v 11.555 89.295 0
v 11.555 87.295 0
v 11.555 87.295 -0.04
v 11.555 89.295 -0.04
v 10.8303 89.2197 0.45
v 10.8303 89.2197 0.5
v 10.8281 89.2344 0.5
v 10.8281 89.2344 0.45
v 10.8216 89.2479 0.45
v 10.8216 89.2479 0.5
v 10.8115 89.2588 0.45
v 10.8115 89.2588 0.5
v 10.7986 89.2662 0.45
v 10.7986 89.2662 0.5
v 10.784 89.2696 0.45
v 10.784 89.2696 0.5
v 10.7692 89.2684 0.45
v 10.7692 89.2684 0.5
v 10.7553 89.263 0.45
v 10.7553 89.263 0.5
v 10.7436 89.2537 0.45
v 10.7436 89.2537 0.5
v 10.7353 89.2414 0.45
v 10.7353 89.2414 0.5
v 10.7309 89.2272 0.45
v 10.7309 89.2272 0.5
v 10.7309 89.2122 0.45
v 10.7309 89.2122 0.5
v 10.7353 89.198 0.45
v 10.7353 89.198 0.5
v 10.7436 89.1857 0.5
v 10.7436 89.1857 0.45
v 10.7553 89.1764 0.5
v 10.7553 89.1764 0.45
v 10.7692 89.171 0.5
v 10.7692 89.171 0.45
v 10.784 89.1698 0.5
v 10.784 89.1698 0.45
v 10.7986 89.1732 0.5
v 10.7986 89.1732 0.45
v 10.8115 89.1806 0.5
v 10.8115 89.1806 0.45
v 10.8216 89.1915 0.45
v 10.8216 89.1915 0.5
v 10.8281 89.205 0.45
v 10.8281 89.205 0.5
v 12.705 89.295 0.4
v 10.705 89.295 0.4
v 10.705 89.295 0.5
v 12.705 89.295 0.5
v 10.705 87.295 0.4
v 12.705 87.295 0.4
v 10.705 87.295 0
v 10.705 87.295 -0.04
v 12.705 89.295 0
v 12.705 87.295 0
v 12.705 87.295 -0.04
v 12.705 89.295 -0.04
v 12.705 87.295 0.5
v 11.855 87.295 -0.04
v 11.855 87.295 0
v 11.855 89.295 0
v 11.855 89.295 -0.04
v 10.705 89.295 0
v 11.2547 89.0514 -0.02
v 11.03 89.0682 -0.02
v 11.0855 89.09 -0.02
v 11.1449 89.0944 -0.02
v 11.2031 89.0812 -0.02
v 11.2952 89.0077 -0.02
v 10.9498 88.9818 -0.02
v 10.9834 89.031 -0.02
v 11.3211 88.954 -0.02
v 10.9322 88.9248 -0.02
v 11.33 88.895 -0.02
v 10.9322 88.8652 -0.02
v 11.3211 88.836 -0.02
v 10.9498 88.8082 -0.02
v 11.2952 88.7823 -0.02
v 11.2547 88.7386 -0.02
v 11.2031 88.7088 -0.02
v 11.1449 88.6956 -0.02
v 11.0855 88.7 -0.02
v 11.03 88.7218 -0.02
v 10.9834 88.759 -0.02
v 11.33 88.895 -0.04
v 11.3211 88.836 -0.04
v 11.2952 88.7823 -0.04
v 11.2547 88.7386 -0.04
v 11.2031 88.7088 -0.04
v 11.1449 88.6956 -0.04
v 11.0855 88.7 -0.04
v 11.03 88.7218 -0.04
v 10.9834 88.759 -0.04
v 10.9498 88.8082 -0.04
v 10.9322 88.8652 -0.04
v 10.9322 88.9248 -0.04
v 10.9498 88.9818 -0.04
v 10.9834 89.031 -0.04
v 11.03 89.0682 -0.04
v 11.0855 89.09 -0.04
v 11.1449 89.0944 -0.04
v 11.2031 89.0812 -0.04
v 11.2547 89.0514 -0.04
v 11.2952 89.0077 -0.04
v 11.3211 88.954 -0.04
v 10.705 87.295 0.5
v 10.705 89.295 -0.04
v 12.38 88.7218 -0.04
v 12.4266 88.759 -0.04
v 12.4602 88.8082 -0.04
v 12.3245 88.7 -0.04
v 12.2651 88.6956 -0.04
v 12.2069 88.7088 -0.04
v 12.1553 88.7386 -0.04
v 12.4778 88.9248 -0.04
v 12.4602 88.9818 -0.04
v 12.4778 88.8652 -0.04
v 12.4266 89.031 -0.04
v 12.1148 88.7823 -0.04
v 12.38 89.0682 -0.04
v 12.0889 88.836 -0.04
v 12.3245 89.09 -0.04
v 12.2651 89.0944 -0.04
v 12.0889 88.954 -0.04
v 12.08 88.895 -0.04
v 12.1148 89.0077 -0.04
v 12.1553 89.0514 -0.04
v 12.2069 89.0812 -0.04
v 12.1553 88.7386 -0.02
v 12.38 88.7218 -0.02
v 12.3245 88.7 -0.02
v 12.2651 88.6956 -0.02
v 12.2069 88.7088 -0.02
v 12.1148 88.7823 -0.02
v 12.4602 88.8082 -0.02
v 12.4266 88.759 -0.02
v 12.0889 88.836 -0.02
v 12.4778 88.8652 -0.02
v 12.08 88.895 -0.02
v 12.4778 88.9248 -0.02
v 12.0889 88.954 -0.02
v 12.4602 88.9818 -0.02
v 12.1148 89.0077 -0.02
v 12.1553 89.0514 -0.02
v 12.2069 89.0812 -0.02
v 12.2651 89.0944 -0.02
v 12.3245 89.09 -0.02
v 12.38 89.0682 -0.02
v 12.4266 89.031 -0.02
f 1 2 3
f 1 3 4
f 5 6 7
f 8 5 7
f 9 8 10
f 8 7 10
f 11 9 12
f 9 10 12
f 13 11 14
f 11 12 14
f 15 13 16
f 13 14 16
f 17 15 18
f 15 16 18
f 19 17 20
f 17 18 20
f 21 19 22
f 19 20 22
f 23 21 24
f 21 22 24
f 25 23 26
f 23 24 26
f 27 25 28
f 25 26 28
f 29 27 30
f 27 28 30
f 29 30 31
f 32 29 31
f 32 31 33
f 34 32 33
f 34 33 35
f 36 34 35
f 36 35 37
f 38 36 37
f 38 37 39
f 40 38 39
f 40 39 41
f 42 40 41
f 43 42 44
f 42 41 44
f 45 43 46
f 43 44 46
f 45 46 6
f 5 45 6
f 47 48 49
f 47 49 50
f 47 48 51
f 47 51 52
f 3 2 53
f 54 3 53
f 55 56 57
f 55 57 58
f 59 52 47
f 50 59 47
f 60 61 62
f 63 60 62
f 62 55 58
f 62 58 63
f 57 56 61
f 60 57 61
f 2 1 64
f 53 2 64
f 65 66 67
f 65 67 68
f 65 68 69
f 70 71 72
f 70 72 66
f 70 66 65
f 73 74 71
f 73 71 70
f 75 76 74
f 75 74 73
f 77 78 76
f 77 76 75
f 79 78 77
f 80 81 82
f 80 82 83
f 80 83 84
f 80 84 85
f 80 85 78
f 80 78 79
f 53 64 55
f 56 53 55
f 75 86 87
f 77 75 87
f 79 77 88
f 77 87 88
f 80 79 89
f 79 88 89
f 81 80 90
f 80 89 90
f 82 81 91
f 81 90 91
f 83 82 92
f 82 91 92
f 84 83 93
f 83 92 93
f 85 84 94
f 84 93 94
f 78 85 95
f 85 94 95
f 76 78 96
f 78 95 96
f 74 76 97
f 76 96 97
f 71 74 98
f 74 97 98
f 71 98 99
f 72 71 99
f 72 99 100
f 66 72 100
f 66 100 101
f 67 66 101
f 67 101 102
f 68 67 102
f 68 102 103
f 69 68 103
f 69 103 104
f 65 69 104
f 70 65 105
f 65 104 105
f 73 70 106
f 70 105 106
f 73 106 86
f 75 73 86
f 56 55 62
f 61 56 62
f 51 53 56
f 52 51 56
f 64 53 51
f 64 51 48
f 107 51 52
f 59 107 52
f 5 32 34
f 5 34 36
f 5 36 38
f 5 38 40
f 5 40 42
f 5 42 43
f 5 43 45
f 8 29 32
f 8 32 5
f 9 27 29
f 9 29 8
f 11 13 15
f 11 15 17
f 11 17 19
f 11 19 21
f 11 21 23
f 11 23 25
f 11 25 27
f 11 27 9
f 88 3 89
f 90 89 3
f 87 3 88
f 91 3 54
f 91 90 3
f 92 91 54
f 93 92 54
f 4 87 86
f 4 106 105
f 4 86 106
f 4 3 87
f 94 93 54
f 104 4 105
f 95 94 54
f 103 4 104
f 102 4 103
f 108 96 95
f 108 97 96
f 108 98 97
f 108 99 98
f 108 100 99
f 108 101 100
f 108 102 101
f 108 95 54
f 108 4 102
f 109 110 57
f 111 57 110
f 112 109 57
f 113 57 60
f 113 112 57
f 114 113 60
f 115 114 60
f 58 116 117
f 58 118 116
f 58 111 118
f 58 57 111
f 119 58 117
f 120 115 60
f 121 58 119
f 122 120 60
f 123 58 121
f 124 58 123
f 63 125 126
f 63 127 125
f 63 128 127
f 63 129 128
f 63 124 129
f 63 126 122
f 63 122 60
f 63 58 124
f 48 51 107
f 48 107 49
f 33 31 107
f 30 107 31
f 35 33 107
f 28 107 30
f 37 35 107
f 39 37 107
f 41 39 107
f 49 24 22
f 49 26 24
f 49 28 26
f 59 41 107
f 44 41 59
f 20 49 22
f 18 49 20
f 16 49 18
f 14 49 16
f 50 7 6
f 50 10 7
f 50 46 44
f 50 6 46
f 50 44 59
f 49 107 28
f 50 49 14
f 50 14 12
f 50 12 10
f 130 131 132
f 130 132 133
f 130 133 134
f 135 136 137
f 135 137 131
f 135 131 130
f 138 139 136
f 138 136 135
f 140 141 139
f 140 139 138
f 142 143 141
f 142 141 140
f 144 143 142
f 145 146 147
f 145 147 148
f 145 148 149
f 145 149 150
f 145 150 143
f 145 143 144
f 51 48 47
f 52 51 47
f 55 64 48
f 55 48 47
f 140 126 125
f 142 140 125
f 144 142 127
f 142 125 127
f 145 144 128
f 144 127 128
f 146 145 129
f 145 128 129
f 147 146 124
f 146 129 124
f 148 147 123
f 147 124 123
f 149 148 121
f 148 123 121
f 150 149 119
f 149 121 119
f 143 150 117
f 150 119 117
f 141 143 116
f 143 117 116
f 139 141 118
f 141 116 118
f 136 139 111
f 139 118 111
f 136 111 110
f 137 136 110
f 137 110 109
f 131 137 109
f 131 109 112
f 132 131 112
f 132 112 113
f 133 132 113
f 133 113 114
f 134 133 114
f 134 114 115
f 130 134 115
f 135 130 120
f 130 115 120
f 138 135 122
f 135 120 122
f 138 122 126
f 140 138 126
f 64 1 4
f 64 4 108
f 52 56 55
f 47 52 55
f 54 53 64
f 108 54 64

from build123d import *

# Parameters (mm, degrees)
MODEL_W               = 2
MODEL_H               = 2
BOSS_EXTRUDE1_DEPTH   = 0.4
SKETCH3_W             = 2
SKETCH3_H             = 2
BOSS_EXTRUDE2_DEPTH   = 0.1
SKETCH2_W             = 0.85
SKETCH2_H             = 2
BOSS_EXTRUDE3_DEPTH   = 0.04
BOSS_EXTRUDE3_2_DEPTH = 0.04
SKETCH4_R             = 0.05
CUT_EXTRUDE1_DEPTH    = 0.05
SKETCH6_R             = 0.2
CUT_EXTRUDE3_DEPTH    = 0.02


with BuildPart() as part:
    # Model → Boss-Extrude1 (new body)
    with BuildSketch(Plane.XY):
        with Locations((11.705, 88.295)):
            Rectangle(MODEL_W, MODEL_H)
    extrude(amount=BOSS_EXTRUDE1_DEPTH)


with BuildPart() as body_2:
    # Sketch3 → Boss-Extrude2 (new body)
    with BuildSketch(Plane.XY.offset(0.4)):
        with Locations((11.705, 88.295)):
            Rectangle(SKETCH3_W, SKETCH3_H)
    extrude(amount=BOSS_EXTRUDE2_DEPTH)

    # Sketch4 → Cut-Extrude1 (cut)
    with BuildSketch(Plane.XY.offset(0.5)):
        with Locations((10.780299021, 89.219700979)):
            Circle(SKETCH4_R)
    extrude(amount=-CUT_EXTRUDE1_DEPTH, mode=Mode.SUBTRACT)


with BuildPart() as body_3:
    # Sketch2 → Boss-Extrude3 (new body)
    with BuildSketch(Plane(origin=(0, 0, 0), x_dir=(-1, 0, 0), z_dir=(0, 0, -1))):
        with Locations((-11.13, 88.295)):
            Rectangle(SKETCH2_W, SKETCH2_H)
    extrude(amount=BOSS_EXTRUDE3_DEPTH)


with BuildPart() as body_4:
    # Sketch2 → Boss-Extrude3 2 (new body)
    with BuildSketch(Plane(origin=(0, 0, 0), x_dir=(-1, 0, 0), z_dir=(0, 0, -1))):
        with Locations((-12.28, 88.295)):
            Rectangle(SKETCH2_W, SKETCH2_H)
    extrude(amount=BOSS_EXTRUDE3_2_DEPTH)


with BuildPart() as cut_extrude3_tool:
    # Sketch6 → Cut-Extrude3 (new body)
    with BuildSketch(Plane(origin=(0, 0, -0.04), x_dir=(-1, 0, 0), z_dir=(0, 0, -1))):
        with Locations((-12.28, 88.895)):
            Circle(SKETCH6_R)
        with Locations(Location((-11.13, 88.895, 0), (0, 0, 180))):  # turned: the seam where the file's is
            Circle(SKETCH6_R)
    extrude(amount=-CUT_EXTRUDE3_DEPTH)


with BuildPart() as body_3_1:
    add(body_3.part)

    # Cut-Extrude3: cut by cut_extrude3_tool
    add(cut_extrude3_tool.part, mode=Mode.SUBTRACT)


with BuildPart() as body_4_1:
    add(body_4.part)

    # Cut-Extrude3: cut by cut_extrude3_tool
    add(cut_extrude3_tool.part, mode=Mode.SUBTRACT)


solid = Compound([part.part, body_2.part, body_3_1.part, body_4_1.part])
